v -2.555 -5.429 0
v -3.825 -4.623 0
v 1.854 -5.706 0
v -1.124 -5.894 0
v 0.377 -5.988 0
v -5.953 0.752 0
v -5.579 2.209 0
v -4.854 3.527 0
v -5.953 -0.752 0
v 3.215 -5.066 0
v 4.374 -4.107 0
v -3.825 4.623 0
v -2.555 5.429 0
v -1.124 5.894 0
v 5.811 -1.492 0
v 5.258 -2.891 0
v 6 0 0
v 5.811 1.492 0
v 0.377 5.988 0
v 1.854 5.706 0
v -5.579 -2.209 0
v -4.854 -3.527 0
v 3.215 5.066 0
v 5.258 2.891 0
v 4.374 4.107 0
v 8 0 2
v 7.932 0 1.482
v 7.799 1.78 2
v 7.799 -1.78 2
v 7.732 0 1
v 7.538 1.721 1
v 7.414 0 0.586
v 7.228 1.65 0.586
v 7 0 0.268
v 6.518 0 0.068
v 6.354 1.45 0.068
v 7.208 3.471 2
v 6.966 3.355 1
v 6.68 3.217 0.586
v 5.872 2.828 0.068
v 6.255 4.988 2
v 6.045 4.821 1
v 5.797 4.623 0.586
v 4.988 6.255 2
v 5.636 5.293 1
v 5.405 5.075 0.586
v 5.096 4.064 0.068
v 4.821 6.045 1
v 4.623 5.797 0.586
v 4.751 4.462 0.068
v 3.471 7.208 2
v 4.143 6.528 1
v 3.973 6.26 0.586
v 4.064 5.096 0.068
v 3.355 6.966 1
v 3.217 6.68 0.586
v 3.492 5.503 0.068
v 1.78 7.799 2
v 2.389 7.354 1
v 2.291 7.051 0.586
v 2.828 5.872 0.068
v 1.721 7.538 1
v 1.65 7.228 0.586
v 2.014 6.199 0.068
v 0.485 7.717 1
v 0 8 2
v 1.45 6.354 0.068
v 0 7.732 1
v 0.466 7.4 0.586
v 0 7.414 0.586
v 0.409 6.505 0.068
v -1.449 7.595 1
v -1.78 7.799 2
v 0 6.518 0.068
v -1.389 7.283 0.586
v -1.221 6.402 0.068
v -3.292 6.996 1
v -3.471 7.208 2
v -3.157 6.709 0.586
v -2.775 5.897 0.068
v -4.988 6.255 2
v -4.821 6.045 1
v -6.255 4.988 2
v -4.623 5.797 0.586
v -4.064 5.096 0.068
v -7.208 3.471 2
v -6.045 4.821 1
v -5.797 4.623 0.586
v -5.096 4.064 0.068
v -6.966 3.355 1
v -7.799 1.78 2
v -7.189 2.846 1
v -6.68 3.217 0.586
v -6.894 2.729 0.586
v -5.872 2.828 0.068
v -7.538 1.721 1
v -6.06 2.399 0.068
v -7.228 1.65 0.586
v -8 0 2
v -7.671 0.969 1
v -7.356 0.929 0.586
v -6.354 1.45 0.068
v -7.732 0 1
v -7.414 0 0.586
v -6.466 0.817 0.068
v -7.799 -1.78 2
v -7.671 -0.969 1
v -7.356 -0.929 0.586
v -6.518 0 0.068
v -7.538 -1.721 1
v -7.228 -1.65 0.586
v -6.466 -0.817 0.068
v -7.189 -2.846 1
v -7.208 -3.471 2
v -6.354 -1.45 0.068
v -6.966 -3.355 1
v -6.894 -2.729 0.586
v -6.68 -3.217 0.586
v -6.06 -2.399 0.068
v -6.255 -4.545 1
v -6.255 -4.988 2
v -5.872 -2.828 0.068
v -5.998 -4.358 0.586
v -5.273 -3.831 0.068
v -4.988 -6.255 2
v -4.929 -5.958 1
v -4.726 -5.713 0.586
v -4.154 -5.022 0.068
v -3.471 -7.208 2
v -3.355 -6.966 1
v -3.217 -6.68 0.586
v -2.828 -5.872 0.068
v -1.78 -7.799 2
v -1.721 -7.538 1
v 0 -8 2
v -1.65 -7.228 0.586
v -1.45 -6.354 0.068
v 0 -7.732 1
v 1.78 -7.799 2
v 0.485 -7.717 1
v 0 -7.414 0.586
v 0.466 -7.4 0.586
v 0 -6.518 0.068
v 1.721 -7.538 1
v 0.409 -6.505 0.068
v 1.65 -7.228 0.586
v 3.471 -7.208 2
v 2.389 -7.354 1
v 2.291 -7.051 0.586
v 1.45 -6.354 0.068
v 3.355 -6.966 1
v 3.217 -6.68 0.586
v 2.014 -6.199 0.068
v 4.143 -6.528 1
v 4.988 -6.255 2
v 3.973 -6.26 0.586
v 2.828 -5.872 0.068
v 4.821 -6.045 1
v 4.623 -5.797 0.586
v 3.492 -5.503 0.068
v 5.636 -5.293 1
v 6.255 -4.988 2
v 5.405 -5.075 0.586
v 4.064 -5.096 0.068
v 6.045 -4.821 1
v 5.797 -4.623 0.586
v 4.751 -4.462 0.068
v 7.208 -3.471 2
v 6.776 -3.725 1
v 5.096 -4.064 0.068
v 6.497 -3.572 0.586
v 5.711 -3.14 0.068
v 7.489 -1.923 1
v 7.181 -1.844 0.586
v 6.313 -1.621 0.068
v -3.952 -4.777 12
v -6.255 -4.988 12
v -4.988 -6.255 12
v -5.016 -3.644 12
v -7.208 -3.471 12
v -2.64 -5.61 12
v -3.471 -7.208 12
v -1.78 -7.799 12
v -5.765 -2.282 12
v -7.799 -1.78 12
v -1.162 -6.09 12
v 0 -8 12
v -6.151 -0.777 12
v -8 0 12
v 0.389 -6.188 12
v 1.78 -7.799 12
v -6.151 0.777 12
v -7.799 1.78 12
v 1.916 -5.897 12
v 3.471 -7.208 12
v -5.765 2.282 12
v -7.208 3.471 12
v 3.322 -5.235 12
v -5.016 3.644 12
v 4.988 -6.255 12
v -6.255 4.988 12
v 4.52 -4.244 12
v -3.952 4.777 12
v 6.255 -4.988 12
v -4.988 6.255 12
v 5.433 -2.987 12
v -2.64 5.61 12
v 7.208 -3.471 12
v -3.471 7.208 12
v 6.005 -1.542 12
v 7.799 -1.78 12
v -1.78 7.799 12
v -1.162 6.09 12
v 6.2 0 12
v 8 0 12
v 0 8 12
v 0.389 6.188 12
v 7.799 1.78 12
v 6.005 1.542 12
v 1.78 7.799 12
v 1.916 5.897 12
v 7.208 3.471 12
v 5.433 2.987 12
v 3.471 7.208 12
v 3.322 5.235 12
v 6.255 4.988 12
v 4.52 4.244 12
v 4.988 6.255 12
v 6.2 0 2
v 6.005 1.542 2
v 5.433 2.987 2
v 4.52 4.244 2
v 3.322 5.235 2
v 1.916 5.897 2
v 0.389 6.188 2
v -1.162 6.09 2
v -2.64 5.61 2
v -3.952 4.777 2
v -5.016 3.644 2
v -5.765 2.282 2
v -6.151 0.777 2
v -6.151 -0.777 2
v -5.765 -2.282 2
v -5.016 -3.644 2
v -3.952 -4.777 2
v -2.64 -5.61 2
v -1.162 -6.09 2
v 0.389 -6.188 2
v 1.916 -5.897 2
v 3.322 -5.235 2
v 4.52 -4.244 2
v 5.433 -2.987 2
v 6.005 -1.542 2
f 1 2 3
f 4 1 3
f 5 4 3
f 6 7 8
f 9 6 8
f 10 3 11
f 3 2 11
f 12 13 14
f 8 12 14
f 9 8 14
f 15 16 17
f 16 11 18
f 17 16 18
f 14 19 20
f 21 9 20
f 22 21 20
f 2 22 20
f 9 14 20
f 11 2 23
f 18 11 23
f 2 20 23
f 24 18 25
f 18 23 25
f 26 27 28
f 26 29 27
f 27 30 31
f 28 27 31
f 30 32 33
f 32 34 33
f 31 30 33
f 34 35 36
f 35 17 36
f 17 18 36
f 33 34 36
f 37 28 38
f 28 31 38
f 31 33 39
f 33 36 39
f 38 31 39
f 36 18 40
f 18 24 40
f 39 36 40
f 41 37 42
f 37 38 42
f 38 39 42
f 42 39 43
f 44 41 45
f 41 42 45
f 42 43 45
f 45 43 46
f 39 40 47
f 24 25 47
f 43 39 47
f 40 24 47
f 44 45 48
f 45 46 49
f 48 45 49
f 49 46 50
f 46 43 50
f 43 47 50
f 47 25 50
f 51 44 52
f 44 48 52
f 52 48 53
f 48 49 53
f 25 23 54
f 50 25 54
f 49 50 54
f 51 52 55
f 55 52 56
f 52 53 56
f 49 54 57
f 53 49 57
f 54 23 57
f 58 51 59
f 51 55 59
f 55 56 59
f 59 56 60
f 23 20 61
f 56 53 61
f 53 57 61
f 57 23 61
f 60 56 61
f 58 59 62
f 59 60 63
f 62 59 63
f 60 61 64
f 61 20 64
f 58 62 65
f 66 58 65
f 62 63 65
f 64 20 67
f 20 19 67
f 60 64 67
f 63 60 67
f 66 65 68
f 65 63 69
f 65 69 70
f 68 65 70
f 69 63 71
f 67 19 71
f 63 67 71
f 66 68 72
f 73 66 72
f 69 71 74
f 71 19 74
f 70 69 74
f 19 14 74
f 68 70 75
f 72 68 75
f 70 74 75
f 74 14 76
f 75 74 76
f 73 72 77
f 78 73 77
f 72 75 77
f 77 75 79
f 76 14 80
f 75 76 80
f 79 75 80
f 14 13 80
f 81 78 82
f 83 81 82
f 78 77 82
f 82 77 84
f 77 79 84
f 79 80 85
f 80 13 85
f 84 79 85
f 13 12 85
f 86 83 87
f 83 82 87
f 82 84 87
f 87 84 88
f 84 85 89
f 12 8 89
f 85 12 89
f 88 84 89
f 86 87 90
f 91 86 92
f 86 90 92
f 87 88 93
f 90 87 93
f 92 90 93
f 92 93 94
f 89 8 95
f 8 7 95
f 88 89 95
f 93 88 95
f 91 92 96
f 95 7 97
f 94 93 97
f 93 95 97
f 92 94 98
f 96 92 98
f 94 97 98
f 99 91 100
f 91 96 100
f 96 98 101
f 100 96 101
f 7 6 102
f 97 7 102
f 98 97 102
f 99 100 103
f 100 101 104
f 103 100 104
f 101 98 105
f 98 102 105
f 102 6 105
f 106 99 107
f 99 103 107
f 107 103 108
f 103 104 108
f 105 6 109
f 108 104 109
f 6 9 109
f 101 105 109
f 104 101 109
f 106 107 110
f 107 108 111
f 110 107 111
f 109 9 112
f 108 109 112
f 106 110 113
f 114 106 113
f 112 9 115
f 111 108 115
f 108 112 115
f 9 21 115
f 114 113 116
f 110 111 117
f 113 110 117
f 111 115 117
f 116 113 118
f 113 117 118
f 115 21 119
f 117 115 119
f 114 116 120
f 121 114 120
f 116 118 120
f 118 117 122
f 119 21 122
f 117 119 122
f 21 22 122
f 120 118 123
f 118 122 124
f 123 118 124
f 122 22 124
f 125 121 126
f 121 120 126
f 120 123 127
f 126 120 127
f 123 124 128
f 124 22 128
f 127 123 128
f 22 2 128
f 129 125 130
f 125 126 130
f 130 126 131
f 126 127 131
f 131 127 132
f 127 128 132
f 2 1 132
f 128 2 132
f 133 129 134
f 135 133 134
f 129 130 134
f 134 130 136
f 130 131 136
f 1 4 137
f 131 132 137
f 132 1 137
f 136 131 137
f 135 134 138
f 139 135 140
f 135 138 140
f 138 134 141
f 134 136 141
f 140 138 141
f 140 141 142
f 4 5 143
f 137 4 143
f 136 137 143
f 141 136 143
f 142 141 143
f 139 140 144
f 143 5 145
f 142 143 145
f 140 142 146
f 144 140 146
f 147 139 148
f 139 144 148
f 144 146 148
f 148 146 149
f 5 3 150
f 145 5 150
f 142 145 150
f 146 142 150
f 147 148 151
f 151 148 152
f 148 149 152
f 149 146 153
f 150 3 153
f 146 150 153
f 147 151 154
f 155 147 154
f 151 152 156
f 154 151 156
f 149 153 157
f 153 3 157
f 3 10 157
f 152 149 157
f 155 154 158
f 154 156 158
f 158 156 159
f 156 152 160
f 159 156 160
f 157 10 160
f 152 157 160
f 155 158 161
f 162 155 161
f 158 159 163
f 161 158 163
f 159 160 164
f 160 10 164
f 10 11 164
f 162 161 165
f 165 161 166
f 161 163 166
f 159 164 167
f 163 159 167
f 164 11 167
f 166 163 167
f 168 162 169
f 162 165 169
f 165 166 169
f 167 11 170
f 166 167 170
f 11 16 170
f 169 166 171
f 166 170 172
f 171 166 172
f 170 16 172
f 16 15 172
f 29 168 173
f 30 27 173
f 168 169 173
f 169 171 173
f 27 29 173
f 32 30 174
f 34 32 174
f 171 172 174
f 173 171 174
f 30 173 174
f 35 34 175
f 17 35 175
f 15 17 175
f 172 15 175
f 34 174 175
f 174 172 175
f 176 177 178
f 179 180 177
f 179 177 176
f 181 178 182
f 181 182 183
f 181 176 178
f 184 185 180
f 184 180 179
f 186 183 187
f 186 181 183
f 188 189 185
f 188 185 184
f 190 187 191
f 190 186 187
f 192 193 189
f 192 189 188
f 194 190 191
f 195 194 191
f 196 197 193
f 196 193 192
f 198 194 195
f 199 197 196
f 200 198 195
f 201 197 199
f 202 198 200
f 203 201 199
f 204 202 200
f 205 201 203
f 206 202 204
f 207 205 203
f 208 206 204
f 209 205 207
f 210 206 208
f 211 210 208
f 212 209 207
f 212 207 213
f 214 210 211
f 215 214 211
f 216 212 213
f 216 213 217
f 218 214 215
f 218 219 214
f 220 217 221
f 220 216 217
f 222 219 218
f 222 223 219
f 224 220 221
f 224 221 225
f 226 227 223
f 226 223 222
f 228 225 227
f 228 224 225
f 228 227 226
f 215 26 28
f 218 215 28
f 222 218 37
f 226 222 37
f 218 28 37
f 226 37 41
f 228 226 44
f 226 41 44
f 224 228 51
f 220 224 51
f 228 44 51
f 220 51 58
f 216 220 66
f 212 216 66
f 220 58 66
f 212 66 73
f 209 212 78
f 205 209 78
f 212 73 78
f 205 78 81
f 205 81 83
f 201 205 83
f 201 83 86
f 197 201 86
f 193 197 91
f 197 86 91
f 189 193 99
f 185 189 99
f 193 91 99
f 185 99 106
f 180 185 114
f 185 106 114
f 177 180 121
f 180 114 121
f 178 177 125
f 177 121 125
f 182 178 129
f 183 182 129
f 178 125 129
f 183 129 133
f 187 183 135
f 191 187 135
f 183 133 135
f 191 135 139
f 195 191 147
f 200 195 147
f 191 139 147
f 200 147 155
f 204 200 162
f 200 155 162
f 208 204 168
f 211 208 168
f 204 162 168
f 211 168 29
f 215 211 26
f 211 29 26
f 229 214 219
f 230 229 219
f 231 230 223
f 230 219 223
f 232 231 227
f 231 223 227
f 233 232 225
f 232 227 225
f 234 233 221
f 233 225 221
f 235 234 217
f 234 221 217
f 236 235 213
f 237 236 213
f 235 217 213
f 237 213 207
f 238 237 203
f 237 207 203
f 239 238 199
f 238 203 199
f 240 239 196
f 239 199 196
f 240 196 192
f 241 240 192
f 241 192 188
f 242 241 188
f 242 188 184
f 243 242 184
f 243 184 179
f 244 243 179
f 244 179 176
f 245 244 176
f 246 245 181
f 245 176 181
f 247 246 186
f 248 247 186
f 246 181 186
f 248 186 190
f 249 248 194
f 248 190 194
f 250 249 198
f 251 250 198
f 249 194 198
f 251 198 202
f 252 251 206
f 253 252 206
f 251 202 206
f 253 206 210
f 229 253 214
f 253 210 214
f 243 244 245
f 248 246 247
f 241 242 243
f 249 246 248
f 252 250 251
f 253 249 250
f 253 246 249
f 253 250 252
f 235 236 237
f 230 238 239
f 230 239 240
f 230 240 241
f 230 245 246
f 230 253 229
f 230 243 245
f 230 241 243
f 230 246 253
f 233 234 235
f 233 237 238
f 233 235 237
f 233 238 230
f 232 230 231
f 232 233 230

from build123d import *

# Parameters (mm, degrees)
CYLINDER_R     = 8
CYLINDER_DEPTH = 12
SKETCH_R       = 6.2
POCKET_DEPTH   = 10
FILLET_R       = 2


with BuildPart() as part:
    # Cylinder → Cylinder (new body)
    with BuildSketch(Plane.XY):
        Circle(CYLINDER_R)
    extrude(amount=CYLINDER_DEPTH)

    # Sketch → Pocket (cut)
    with BuildSketch(Plane.XY.offset(12)):
        Circle(SKETCH_R)
    extrude(amount=-POCKET_DEPTH, mode=Mode.SUBTRACT)

    # Fillet
    fillet_edges = [part.edges().sort_by_distance(p)[0] for p in [
        (-8, 0, 0),
    ]]
    fillet(fillet_edges, radius=FILLET_R)


solid = part.part
